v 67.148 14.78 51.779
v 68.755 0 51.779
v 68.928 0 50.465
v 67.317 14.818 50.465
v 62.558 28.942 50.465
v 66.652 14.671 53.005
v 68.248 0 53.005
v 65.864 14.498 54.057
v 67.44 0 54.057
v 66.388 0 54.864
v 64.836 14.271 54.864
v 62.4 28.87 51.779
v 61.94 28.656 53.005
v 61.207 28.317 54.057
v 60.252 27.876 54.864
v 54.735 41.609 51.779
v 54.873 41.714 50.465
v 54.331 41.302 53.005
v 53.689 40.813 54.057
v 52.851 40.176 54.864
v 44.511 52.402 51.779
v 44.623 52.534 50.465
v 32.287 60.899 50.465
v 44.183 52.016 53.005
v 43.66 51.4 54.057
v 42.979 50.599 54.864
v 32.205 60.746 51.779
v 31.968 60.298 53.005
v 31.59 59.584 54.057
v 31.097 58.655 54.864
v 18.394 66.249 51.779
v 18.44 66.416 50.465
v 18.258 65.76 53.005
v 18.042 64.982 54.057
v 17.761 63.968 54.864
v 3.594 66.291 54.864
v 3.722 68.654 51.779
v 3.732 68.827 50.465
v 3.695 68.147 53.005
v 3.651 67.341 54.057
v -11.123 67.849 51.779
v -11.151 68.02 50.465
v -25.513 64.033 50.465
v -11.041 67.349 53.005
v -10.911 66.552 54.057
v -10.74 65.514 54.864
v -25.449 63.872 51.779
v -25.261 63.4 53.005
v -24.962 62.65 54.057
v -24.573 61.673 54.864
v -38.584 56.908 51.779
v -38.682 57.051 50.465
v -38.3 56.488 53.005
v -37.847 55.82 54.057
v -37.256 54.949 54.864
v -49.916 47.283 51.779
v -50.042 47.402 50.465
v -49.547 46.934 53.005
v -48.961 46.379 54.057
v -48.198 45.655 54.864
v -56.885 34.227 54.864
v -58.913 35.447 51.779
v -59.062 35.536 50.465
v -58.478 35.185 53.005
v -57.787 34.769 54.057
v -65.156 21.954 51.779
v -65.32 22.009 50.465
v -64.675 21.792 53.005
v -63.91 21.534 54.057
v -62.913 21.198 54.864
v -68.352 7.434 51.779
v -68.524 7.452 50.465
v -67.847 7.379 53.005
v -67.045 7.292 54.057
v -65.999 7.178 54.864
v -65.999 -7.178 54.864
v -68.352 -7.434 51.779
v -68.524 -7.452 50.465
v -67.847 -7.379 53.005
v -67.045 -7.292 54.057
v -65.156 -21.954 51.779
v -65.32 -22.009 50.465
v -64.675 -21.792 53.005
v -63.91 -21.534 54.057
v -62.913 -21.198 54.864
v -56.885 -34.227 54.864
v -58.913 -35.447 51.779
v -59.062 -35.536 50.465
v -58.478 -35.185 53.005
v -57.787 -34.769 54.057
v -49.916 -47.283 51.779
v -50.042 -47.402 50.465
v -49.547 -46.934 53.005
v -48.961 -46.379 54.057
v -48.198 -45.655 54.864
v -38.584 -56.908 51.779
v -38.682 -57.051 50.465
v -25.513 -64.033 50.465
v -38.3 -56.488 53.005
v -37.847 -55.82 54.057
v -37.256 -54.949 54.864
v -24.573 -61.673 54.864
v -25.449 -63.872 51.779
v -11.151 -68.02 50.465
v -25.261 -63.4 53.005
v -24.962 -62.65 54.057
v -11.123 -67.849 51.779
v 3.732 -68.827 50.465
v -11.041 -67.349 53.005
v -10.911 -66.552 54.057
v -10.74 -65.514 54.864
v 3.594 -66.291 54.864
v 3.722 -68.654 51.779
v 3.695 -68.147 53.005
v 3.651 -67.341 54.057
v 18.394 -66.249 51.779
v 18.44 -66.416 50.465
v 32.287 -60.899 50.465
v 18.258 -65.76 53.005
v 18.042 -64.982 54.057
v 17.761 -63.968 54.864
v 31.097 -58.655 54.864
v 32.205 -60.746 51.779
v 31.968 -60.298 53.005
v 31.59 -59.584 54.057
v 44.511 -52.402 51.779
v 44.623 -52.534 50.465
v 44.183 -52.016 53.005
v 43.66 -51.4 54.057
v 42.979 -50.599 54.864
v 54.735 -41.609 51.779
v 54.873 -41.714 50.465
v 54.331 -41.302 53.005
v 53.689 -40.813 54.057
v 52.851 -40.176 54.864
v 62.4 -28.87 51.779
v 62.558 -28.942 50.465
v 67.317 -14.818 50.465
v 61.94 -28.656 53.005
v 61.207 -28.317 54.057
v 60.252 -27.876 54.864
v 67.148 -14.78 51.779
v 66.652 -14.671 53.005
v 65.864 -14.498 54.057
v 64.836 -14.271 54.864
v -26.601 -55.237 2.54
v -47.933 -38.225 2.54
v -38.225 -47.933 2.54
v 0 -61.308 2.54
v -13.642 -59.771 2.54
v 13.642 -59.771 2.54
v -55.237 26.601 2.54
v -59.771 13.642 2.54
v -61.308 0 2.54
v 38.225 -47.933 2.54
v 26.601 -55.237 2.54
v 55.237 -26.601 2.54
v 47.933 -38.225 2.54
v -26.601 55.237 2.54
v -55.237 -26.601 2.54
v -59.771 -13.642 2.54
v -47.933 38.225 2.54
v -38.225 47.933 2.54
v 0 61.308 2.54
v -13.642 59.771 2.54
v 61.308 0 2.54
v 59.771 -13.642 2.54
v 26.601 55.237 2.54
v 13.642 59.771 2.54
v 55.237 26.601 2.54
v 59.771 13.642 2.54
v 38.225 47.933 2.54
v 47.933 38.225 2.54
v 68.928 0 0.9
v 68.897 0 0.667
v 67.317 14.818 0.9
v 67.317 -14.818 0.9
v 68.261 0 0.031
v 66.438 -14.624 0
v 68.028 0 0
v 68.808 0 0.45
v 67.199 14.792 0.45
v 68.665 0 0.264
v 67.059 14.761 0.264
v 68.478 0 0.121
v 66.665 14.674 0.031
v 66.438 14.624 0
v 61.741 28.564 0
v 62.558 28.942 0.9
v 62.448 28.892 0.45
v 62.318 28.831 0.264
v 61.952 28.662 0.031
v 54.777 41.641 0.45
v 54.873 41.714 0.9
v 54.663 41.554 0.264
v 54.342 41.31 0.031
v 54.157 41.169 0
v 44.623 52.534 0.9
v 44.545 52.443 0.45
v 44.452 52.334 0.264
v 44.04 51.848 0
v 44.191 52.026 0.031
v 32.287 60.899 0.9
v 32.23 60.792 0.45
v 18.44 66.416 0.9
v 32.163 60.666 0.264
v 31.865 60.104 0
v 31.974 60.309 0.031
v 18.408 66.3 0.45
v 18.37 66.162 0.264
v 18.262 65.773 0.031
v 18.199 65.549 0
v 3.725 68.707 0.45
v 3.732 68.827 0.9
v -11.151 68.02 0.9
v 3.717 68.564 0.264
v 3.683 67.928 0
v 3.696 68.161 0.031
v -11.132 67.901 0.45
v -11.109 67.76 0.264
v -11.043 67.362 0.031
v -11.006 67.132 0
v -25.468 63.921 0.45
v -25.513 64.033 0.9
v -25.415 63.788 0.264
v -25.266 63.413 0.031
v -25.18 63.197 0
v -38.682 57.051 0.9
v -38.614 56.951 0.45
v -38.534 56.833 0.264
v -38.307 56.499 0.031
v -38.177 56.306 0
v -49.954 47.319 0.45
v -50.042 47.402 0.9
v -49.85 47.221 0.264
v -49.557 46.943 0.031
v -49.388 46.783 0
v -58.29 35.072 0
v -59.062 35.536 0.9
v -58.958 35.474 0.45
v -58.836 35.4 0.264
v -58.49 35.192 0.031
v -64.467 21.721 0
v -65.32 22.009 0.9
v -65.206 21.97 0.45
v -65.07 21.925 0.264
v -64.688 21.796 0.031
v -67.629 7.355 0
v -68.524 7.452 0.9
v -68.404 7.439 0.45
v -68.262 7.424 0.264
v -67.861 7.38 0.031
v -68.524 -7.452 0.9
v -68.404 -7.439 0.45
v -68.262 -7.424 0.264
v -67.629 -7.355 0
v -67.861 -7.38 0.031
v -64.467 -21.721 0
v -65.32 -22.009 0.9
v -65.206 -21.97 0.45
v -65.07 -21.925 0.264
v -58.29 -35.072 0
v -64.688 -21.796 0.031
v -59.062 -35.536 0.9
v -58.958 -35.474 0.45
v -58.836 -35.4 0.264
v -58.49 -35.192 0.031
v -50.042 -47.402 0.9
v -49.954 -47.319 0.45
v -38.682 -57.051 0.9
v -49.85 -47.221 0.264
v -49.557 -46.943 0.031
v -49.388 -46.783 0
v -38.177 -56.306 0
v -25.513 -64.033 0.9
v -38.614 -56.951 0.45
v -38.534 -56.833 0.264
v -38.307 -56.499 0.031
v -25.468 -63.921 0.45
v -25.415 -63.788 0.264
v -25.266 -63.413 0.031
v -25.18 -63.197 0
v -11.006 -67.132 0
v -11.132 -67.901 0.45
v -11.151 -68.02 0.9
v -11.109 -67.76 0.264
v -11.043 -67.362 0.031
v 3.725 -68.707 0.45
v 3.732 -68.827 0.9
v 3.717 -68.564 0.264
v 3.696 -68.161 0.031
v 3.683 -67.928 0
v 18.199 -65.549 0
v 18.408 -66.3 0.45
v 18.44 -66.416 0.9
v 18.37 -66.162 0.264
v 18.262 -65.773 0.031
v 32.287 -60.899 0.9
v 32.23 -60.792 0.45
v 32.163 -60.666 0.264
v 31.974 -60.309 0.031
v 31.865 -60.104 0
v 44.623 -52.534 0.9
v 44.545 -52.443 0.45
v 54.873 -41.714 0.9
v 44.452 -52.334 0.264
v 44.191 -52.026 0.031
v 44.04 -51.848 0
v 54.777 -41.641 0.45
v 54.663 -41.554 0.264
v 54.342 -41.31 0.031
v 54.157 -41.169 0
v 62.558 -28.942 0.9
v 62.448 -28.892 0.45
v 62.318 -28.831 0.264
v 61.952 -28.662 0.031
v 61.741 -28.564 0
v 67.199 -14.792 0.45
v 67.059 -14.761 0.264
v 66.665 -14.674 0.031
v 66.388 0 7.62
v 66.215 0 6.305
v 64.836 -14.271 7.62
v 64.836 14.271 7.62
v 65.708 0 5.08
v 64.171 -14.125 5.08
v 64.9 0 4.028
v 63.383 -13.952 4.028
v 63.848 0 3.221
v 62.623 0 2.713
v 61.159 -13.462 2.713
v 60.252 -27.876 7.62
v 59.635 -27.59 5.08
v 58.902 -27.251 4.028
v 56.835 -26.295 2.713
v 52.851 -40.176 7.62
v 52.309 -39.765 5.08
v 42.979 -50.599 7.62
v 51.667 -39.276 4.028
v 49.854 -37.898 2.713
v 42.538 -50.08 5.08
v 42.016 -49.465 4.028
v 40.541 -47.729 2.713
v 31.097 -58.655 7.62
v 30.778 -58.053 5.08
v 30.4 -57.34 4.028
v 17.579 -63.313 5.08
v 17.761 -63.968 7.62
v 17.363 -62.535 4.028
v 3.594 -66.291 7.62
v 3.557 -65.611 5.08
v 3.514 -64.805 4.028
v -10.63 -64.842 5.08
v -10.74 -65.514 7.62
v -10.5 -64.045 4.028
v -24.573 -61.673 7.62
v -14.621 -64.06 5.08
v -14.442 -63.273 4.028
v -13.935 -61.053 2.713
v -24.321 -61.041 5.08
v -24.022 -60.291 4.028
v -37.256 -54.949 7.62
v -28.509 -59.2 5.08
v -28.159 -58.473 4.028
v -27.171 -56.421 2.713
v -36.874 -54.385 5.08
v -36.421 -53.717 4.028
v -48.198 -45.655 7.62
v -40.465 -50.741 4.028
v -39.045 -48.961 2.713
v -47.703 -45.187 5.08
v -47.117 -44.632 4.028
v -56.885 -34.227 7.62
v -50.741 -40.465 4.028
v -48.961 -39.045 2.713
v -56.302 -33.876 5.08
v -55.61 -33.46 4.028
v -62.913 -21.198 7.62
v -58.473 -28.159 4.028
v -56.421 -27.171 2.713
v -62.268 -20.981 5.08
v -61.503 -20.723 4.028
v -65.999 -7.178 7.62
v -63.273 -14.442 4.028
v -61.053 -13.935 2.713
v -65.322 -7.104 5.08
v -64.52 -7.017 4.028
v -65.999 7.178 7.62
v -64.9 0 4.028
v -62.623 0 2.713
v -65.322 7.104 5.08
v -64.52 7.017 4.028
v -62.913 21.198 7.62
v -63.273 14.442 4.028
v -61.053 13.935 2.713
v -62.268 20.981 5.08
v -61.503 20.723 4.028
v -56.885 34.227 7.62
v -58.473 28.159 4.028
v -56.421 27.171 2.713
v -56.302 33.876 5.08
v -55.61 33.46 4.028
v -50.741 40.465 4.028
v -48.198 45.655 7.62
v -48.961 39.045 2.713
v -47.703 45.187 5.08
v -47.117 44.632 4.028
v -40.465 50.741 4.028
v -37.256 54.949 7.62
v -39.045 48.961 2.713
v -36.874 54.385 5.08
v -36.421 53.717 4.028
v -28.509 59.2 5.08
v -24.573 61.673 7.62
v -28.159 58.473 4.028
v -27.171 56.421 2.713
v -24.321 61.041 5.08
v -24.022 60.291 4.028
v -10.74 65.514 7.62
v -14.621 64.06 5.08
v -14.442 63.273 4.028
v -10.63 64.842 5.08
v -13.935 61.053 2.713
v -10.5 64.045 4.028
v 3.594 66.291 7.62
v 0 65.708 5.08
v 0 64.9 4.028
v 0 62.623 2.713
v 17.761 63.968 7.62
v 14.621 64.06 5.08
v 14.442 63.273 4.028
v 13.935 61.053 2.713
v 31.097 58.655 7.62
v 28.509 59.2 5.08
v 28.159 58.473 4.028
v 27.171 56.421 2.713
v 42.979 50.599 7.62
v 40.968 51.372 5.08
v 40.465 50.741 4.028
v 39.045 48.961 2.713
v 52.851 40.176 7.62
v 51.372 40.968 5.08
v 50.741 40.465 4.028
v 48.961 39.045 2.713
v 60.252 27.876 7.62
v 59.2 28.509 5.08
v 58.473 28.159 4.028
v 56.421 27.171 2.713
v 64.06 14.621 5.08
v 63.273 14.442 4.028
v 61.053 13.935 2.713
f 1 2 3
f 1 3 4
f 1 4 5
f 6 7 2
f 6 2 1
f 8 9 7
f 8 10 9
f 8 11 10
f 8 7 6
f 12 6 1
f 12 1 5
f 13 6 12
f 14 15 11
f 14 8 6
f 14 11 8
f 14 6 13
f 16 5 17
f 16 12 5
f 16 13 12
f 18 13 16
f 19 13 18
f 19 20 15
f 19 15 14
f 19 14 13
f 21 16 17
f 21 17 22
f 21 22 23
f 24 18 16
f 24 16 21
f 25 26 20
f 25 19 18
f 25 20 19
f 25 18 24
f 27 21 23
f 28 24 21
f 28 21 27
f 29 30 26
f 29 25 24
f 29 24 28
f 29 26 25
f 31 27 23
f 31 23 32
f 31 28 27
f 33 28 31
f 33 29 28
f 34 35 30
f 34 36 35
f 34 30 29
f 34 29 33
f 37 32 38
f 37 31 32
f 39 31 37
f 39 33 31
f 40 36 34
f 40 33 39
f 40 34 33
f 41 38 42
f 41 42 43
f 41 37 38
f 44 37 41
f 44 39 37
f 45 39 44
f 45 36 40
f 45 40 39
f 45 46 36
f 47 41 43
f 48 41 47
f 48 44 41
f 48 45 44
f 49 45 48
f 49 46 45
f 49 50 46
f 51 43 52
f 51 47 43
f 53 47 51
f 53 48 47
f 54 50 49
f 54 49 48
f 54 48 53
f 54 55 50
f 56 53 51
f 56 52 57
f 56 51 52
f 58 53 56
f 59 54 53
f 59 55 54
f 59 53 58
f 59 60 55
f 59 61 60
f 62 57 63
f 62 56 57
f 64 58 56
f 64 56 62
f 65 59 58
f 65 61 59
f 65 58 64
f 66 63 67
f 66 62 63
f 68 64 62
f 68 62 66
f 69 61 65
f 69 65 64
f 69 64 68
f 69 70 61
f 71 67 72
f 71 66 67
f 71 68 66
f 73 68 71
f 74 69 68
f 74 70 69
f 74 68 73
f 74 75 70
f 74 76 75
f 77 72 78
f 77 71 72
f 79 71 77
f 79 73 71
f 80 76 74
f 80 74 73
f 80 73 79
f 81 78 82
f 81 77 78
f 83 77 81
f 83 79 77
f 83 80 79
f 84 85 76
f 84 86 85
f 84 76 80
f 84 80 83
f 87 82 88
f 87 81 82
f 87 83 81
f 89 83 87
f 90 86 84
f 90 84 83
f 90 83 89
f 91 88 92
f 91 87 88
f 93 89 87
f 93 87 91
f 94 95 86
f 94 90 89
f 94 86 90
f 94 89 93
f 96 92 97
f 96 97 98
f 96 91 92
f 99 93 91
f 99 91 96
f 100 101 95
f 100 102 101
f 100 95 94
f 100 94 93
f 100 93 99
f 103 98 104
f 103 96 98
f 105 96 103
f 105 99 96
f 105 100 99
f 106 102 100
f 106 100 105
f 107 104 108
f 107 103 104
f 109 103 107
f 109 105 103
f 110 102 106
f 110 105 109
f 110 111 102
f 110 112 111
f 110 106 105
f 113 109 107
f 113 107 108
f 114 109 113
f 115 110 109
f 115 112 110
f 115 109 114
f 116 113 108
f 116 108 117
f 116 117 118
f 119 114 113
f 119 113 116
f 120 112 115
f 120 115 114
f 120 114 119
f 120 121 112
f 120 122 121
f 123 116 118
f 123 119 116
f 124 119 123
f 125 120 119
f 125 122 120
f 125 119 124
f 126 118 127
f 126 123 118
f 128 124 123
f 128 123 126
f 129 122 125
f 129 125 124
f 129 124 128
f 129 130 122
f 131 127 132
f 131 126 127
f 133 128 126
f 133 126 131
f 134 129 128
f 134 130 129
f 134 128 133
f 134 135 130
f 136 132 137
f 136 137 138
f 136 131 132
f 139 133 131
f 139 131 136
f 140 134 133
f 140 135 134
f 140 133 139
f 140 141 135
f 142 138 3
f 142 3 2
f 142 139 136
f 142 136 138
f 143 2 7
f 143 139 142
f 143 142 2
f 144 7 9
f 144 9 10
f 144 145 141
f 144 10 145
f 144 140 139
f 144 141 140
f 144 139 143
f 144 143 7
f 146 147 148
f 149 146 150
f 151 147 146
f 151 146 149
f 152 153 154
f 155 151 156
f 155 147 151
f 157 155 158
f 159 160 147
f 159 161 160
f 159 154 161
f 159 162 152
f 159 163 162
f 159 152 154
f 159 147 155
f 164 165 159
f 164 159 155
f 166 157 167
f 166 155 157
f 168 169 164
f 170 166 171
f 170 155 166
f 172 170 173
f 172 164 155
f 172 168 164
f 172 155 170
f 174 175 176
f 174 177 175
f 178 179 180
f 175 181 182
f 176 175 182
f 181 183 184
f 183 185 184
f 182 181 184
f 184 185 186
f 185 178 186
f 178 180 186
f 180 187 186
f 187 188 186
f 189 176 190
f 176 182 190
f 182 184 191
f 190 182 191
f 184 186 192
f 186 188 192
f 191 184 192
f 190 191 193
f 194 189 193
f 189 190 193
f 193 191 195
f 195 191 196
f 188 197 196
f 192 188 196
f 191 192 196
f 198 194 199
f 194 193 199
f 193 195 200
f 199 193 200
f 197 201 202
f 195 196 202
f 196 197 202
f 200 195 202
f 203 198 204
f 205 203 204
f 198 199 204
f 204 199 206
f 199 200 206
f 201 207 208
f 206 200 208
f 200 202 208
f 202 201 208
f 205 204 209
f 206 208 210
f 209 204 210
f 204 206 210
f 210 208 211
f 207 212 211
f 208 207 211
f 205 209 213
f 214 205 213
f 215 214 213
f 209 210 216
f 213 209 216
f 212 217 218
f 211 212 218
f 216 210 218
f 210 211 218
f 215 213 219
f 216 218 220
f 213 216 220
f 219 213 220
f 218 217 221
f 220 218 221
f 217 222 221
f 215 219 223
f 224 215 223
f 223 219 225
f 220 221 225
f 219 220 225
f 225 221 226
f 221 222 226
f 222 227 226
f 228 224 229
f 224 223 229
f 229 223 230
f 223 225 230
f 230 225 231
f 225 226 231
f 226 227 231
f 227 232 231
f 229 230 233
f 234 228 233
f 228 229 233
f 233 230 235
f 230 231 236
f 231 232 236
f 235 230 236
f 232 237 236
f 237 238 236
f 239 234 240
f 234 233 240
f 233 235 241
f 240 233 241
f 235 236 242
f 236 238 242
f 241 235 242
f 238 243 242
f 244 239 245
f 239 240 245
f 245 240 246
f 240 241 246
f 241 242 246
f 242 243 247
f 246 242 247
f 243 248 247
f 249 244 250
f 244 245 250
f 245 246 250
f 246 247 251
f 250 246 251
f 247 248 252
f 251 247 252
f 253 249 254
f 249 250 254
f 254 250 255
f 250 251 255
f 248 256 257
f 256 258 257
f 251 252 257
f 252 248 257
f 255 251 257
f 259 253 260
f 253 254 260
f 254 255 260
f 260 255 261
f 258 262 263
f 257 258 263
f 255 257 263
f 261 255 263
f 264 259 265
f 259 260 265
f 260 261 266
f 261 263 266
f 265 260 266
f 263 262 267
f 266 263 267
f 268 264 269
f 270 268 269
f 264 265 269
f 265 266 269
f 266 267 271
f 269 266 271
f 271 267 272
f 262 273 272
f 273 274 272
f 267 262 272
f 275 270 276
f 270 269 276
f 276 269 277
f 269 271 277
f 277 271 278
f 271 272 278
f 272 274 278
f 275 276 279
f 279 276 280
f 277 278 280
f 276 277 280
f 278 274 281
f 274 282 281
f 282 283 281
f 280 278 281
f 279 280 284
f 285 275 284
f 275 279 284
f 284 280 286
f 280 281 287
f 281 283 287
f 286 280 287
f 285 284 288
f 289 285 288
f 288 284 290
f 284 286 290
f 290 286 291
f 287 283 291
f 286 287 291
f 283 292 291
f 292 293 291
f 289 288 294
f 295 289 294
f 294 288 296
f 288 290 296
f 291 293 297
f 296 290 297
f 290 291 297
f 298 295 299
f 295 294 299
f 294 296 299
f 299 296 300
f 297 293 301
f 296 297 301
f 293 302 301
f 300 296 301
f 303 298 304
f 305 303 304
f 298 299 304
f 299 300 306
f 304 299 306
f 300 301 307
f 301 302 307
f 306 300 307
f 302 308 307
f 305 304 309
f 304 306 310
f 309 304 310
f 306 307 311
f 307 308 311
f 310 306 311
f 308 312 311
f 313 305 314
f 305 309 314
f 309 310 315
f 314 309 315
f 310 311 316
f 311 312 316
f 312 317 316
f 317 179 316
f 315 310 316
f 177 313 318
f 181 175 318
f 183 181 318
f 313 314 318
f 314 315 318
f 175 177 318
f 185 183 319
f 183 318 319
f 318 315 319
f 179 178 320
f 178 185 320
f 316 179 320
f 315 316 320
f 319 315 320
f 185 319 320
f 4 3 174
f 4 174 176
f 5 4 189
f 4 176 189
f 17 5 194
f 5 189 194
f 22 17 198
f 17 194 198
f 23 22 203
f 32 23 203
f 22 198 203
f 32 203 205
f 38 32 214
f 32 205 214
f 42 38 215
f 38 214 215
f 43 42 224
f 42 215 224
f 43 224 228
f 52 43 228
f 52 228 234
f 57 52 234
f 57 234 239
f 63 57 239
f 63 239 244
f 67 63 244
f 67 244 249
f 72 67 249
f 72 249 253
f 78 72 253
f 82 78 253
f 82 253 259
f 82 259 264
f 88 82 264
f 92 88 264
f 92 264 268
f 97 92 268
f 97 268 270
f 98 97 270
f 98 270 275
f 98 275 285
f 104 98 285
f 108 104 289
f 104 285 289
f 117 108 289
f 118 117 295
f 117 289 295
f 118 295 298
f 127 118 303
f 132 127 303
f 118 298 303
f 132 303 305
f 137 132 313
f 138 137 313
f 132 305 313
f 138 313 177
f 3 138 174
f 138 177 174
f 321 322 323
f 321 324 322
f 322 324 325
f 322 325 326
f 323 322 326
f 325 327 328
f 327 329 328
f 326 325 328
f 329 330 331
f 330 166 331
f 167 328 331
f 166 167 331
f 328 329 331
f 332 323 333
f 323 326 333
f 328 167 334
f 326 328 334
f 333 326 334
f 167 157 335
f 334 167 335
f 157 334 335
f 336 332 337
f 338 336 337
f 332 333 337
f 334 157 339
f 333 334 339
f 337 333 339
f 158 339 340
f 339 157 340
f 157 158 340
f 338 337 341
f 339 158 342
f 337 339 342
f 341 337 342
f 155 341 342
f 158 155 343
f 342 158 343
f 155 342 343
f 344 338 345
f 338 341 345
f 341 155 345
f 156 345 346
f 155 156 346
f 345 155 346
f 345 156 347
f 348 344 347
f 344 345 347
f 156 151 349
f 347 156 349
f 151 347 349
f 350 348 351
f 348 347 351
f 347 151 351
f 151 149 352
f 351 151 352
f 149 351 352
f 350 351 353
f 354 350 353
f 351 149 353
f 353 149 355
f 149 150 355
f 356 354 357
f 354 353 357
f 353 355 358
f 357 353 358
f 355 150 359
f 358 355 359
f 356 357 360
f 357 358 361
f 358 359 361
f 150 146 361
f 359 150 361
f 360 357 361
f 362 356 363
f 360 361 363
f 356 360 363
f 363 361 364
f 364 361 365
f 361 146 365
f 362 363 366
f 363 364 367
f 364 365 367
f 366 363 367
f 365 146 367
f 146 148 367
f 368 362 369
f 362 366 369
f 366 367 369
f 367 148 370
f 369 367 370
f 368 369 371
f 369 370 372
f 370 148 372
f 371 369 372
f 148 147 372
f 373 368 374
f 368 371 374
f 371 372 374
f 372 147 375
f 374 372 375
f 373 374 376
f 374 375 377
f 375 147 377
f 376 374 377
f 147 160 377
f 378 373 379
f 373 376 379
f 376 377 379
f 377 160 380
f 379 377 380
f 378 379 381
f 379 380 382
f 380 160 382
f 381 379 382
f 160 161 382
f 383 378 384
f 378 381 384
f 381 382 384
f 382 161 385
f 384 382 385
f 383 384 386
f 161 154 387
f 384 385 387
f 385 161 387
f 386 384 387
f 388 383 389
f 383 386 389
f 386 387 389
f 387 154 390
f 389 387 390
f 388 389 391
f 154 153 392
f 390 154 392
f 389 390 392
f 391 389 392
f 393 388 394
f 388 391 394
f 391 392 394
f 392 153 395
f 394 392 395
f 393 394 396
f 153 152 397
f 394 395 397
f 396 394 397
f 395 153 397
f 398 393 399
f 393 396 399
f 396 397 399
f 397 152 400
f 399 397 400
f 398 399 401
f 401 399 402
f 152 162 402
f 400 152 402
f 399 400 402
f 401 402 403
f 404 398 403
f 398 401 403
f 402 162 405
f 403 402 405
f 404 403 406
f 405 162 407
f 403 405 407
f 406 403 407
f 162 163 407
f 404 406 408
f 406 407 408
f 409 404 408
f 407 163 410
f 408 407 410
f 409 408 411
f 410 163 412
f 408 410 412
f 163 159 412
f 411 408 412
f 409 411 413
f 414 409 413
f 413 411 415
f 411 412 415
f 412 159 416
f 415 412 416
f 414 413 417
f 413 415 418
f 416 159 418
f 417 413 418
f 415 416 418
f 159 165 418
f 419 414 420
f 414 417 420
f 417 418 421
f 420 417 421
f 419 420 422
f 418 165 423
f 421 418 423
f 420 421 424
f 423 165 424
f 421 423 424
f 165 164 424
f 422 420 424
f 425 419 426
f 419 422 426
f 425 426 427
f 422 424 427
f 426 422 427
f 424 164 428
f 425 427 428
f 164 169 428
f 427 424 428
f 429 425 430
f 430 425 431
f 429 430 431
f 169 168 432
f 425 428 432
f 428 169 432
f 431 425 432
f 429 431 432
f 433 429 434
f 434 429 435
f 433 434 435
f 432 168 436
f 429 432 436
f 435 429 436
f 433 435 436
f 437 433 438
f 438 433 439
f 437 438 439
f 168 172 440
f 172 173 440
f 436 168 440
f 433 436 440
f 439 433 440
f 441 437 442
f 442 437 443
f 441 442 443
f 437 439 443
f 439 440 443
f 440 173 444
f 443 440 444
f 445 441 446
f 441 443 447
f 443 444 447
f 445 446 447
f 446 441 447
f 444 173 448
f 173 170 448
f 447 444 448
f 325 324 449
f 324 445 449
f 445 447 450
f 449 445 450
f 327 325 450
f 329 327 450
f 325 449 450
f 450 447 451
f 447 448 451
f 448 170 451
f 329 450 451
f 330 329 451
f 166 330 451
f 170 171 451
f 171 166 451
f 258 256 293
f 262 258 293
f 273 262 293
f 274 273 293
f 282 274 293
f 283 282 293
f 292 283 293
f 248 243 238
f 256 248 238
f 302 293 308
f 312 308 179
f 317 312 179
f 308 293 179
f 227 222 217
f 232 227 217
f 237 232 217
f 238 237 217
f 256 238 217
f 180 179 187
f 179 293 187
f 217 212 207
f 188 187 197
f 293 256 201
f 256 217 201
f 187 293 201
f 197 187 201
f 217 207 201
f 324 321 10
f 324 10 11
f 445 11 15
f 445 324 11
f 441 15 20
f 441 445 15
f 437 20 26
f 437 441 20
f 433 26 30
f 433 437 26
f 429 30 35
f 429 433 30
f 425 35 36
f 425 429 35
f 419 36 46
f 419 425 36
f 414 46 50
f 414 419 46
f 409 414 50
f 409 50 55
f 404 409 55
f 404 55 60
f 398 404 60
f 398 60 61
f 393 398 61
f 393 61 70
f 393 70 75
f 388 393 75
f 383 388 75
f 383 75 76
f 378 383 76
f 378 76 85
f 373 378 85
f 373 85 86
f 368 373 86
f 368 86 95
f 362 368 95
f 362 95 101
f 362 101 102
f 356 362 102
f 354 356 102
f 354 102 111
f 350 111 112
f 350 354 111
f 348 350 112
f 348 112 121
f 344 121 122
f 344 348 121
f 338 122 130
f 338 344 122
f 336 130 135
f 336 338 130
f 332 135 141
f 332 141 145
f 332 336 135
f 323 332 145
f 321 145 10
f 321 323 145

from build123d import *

# Parameters (mm, degrees)
F0_R     = 68.9281560168
F1_DEPTH = 54.864
F2_T     = -2.54
F4_R     = 0.9
F5_R     = 5.08


# Not quite as in the source:
# - a fillet or chamfer that OpenCascade refuses, or shapes differently, is made with other operations: its cross-section is extruded or revolved along the edge and cut away or added


with BuildPart() as f1:
    # F0 (on Top) → F1 (new body)
    with BuildSketch(Plane.XY):
        Circle(F0_R)
    extrude(amount=F1_DEPTH)

    # F2
    f2_openings = [f1.faces().sort_by_distance(p)[0] for p in [
        (0, 0, 54.864),
    ]]
    offset(amount=F2_T, openings=f2_openings)

    # F3: fillet of radius 5.08 on 1 edges, made by hand

    # F3_s1 → F3_t2 (revolve, cut)
    with BuildSketch(Plane.XZ):
        with BuildLine():
            ThreePointArc((68.9281560168, 50.4645909488), (68.247565068, 53.0045909488), (66.3881560168, 54.864))
            Line((66.3881560168, 54.864), (68.9281560168, 54.864))
            Line((68.9281560168, 54.864), (68.9281560168, 50.4645909488))
        make_face()
    revolve(axis=Axis((0, 0, 54.864), (0, 0, 1)), mode=Mode.SUBTRACT)

    # F4
    f4_edges = [f1.edges().sort_by_distance(p)[0] for p in [
        (-68.928156, 0, 0),
    ]]
    fillet(f4_edges, radius=F4_R)

    # F5
    f5_edges = [f1.edges().sort_by_distance(p)[0] for p in [
        (-66.388156, 0, 2.54),
    ]]
    fillet(f5_edges, radius=F5_R)


solid = f1.part
